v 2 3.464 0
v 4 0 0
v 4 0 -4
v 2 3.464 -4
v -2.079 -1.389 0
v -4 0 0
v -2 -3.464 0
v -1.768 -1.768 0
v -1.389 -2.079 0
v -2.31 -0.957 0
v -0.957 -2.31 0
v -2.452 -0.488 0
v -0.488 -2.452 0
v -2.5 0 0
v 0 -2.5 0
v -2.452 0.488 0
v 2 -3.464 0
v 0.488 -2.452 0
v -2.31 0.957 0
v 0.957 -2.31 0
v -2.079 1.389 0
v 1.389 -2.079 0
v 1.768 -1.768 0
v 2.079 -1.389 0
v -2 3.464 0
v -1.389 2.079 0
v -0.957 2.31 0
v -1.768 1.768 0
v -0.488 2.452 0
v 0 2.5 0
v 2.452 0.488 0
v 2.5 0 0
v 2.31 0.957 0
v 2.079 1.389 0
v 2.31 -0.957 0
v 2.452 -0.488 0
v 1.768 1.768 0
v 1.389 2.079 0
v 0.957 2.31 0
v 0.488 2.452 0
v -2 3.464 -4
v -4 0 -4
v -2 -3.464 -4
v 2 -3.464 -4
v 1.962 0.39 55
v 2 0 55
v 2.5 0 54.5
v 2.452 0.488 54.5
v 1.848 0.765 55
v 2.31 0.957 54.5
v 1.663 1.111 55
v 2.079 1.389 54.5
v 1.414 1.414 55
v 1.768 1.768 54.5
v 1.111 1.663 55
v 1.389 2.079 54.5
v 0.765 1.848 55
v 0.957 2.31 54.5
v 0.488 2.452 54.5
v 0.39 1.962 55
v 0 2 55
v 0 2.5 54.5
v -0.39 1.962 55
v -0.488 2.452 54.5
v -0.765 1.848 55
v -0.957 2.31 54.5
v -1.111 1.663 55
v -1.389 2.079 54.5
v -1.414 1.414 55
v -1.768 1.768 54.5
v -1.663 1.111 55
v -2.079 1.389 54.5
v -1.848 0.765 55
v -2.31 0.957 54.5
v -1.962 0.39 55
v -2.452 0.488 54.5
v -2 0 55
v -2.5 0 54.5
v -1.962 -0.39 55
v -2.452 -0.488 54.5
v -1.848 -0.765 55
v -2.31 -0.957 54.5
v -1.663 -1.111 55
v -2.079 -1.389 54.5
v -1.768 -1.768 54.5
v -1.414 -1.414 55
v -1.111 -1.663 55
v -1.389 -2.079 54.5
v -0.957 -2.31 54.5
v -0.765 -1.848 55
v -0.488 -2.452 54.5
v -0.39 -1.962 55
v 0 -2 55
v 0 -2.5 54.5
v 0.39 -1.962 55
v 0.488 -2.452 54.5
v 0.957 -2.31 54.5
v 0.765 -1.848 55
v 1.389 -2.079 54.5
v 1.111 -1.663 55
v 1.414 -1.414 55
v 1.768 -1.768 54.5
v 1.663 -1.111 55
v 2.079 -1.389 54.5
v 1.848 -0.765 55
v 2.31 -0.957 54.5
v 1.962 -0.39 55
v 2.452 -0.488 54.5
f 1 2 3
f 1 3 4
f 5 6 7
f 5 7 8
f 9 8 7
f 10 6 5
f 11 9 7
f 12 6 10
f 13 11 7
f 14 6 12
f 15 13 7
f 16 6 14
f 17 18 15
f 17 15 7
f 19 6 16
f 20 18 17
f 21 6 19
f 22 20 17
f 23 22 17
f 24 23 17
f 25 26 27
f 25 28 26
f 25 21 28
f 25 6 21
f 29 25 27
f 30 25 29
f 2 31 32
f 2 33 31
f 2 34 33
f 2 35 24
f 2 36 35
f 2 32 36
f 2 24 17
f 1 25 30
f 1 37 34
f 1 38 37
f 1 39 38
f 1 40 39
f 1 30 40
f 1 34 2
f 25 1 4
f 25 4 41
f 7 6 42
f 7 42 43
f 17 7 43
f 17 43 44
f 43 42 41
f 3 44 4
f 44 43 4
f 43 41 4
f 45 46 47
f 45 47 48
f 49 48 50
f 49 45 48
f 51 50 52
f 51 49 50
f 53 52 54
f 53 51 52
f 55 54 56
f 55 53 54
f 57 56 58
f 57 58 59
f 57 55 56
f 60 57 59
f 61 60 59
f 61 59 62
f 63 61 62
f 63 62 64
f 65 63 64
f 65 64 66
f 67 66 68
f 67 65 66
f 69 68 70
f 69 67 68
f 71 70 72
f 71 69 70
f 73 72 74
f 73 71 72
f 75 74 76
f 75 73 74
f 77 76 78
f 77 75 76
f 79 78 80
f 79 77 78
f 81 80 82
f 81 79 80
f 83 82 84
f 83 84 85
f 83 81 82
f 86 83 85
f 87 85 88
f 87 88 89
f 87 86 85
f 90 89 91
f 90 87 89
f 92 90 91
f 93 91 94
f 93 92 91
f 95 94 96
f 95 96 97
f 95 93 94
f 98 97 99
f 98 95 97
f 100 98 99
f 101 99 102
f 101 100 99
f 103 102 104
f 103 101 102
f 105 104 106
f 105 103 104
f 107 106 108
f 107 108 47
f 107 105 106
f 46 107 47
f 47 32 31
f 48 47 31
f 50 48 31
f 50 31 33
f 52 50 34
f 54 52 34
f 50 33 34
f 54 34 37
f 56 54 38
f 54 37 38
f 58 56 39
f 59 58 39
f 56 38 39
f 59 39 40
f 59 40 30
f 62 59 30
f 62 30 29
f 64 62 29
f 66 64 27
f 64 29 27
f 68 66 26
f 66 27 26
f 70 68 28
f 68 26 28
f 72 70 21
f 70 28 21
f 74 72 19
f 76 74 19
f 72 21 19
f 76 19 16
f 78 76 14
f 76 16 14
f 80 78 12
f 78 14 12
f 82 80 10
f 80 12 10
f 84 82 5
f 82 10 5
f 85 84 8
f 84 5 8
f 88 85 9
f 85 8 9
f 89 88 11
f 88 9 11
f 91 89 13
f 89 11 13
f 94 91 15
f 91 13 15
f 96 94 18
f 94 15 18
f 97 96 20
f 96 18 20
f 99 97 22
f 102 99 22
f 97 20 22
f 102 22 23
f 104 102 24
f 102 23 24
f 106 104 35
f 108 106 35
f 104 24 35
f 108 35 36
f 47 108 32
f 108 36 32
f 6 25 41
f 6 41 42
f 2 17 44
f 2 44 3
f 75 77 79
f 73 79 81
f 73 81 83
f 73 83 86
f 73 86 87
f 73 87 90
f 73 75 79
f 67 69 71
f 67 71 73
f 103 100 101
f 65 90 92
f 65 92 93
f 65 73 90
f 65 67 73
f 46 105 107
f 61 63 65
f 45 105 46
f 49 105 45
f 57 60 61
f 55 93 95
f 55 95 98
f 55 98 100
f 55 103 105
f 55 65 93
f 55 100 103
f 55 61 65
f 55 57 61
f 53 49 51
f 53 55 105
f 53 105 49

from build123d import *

# Parameters (mm, degrees)
SKETCH_1_R      = 2.5
EXTRUDE_1_DEPTH = 55
EXTRUDE_2_DEPTH = 4
CHAMFER_1_SIZE  = 0.5


with BuildPart() as part:
    # 草图1 → 拉伸1 (new body)
    with BuildSketch(Plane.XY):
        Circle(SKETCH_1_R)
    extrude(amount=EXTRUDE_1_DEPTH)

    # 草图2 → 拉伸2 (add)
    with BuildSketch(Plane.XY):
        Polygon((2, -3.464101615), (4, 0), (2, 3.464101615), (-2, 3.464101615), (-4, 0), (-2, -3.464101615), align=None)
    extrude(amount=-EXTRUDE_2_DEPTH)

    # 倒角1
    chamfer_1_edges = [part.edges().sort_by_distance(p)[0] for p in [
        (-2.5, 0, 55),
    ]]
    chamfer(chamfer_1_edges, length=CHAMFER_1_SIZE)


solid = part.part
